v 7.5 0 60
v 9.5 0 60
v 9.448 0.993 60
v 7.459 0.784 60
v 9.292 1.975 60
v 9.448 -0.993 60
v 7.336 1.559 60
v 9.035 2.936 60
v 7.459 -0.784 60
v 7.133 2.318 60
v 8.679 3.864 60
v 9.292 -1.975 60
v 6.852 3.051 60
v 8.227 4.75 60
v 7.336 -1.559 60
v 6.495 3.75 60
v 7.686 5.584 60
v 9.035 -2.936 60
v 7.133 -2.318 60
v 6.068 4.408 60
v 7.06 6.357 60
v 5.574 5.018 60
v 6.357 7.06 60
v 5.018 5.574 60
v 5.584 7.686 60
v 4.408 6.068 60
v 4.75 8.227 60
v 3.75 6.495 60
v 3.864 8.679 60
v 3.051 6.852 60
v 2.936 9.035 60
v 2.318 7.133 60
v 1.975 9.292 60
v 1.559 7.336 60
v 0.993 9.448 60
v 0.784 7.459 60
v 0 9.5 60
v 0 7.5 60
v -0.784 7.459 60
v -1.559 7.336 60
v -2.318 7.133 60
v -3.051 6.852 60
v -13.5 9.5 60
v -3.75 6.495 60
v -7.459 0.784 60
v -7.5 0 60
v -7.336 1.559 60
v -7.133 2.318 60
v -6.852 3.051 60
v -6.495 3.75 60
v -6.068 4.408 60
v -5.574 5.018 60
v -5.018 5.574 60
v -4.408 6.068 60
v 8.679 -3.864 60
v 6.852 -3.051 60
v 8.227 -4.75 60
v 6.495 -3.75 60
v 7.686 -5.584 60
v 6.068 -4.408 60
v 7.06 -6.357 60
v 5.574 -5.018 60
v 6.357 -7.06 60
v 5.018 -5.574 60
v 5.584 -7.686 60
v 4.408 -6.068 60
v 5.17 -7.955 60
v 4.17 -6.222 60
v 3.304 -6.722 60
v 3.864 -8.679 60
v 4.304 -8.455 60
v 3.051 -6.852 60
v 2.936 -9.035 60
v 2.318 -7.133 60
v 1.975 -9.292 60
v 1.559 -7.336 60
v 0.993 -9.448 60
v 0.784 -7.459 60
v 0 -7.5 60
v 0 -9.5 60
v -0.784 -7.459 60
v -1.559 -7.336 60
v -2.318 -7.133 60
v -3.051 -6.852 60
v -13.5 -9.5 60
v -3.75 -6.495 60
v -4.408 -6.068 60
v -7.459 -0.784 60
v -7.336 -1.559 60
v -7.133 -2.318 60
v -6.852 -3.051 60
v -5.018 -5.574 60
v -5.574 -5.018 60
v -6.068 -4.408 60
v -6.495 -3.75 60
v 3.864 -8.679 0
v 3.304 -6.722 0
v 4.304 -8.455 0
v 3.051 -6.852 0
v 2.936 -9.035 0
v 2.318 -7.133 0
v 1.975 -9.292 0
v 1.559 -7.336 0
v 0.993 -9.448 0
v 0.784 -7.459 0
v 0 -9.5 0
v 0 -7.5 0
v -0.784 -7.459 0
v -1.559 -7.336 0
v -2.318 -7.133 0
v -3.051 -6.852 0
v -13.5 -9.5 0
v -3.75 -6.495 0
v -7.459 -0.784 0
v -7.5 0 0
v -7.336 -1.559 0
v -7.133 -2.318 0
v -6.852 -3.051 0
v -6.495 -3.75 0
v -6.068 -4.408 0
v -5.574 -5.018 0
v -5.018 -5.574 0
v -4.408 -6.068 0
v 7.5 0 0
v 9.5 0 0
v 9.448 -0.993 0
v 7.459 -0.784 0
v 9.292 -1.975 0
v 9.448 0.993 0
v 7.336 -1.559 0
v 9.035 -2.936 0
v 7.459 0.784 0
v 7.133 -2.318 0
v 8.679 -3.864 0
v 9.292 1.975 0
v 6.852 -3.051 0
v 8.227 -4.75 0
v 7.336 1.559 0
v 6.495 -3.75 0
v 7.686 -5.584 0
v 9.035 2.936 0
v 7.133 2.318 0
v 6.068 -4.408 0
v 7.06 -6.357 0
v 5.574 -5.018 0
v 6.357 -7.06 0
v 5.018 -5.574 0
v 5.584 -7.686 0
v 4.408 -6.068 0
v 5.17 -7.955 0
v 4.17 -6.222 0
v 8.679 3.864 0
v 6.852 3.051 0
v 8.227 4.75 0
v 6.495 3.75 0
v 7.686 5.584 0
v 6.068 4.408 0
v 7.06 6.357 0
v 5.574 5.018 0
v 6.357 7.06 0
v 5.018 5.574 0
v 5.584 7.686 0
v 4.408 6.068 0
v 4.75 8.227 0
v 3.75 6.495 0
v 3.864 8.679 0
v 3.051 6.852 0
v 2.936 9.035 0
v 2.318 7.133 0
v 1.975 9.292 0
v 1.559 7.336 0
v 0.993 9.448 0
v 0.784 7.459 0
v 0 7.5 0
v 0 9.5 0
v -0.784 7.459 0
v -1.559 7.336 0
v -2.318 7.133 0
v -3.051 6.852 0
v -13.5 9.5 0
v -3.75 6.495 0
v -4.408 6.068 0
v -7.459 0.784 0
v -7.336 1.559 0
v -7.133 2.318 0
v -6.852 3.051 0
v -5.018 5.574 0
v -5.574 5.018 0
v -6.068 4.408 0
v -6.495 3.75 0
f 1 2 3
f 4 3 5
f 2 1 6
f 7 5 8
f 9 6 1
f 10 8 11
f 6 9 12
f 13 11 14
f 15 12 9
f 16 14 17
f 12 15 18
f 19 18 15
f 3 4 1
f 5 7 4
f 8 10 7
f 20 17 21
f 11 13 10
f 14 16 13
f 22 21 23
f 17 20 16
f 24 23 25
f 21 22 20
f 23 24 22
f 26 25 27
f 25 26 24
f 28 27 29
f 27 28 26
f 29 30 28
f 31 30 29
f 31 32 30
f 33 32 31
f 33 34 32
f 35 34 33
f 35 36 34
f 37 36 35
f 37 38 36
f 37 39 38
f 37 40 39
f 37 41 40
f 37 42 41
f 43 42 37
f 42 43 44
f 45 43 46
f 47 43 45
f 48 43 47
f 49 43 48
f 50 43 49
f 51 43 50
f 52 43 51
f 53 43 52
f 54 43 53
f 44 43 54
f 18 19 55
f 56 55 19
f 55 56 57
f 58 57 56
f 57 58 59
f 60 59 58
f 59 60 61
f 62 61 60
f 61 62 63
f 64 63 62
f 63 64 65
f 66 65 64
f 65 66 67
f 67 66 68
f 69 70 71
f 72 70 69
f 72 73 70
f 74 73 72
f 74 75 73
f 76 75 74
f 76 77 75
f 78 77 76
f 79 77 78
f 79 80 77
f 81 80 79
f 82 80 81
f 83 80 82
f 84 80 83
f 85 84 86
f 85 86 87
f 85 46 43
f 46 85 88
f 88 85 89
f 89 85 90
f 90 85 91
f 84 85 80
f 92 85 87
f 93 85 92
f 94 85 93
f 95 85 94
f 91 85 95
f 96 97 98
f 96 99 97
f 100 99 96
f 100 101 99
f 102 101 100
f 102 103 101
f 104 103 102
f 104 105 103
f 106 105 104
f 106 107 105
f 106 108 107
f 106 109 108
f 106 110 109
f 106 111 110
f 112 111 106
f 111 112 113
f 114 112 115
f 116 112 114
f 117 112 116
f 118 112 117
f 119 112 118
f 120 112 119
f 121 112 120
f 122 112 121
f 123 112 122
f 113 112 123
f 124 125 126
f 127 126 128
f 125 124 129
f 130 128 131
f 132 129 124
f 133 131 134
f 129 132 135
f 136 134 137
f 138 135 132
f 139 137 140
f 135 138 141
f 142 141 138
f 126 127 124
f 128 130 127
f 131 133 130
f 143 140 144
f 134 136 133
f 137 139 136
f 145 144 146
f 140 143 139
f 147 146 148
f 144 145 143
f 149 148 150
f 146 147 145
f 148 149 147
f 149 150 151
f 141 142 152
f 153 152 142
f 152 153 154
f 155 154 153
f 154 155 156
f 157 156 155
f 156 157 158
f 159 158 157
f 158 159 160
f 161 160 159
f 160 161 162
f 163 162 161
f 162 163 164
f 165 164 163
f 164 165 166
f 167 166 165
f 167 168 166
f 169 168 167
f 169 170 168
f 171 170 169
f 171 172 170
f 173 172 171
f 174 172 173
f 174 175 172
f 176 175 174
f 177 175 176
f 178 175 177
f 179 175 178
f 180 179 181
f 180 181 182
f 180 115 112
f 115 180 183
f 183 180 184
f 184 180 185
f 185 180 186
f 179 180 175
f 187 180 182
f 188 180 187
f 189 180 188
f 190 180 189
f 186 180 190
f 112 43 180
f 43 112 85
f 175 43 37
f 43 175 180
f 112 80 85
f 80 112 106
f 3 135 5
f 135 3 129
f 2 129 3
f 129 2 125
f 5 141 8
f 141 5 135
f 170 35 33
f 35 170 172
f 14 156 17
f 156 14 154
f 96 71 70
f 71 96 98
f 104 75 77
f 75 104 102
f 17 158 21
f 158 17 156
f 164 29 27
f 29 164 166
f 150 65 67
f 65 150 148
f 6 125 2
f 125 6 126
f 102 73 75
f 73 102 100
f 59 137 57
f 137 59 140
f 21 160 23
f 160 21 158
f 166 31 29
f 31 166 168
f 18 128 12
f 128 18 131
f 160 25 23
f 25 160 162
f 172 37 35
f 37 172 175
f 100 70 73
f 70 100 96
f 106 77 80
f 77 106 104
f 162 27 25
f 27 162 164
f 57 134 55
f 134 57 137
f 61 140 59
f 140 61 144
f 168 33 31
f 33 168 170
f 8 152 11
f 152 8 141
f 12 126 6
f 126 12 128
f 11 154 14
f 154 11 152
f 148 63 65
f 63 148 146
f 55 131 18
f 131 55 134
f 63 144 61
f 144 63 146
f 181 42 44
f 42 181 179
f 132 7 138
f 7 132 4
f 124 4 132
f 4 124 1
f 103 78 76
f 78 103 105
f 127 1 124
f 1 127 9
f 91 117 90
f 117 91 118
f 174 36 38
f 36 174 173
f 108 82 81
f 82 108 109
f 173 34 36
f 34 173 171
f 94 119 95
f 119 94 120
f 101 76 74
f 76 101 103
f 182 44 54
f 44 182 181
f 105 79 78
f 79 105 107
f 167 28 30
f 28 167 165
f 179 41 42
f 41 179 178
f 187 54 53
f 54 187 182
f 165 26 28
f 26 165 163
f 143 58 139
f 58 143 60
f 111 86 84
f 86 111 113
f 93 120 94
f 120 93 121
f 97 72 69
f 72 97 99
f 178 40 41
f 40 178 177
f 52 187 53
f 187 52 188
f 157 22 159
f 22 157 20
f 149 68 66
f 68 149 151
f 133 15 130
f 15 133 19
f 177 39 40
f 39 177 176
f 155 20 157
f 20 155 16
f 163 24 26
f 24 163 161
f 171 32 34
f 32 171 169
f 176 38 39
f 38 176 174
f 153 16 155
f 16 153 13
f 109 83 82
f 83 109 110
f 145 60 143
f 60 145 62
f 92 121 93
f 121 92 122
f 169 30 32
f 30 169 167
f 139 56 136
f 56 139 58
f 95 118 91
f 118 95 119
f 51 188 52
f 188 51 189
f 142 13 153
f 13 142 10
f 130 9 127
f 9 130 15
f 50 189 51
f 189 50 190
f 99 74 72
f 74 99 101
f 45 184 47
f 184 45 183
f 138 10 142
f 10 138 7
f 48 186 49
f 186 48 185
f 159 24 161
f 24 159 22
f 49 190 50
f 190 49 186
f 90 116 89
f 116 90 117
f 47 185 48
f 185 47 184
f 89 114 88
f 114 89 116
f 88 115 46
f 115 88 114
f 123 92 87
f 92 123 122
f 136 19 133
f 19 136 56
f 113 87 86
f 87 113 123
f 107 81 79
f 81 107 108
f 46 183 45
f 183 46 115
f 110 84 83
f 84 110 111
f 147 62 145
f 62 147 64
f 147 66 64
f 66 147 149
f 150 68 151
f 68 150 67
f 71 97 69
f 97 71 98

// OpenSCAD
// PRUSA iteration3
// Bearing holders
// GNU GPL v3
// Josef Průša <iam@josefprusa.cz> and contributors
// http://www.reprap.org/wiki/Prusa_Mendel
// http://prusamendel.org

bearing_diameter = 15;

module horizontal_bearing_base(bearings=1){
 translate(v=[0,0,6]) cube(size = [24,8+bearings*25,12], center = true);	
}
module horizontal_bearing_holes(bearings=1){
 cutter_lenght = 10+bearings*25;
 one_holder_lenght = 8+25;
 holder_lenght = 8+bearings*25;
 
 // Main bearing cut
 difference(){
  translate(v=[0,0,12]) rotate(a=[90,0,0]) translate(v=[0,0,-cutter_lenght/2]) cylinder(h = cutter_lenght, r=bearing_diameter/2, $fn=50);
  // Bearing retainers
  translate(v=[0,1-holder_lenght/2,3]) cube(size = [24,6,8], center = true);
  translate(v=[0,-1+holder_lenght/2,3]) cube(size = [24,6,8], center = true);
 }
 
 // Ziptie cutouts
 ziptie_cut_ofset = 0;
 for ( i = [0 : bearings-1] ){
  // For easier positioning I move them by half of one 
  // bearing holder then add each bearign lenght and then center again
  translate(v=[0,-holder_lenght/2,0]) translate(v=[0,one_holder_lenght/2+i*25,0]) difference(){
   union(){
    translate(v=[0,2-6,12]) rotate(a=[90,0,0]) translate(v=[0,0,0]) cylinder(h = 4, r=12.5, $fn=50);
    translate(v=[0,2+6,12]) rotate(a=[90,0,0]) translate(v=[0,0,0]) cylinder(h = 4, r=12.5, $fn=50);
   }
   translate(v=[0,10,12]) rotate(a=[90,0,0]) translate(v=[0,0,0]) cylinder(h = 24, r=10, $fn=50);
  }
 }
 
}

module horizontal_bearing_test(){
 difference(){
  horizontal_bearing_base(1);
  horizontal_bearing_holes(1);
 }
 translate(v=[30,0,0]) difference(){
  horizontal_bearing_base(2);
  horizontal_bearing_holes(2);
 }
 translate(v=[60,0,0]) difference(){
  horizontal_bearing_base(3);
  horizontal_bearing_holes(3);
 }
}



thinwall = 2;
bearing_size = bearing_diameter + 2 * thinwall;

module vertical_bearing_base(){
 translate(v=[-2-bearing_size/4,0,30]) cube(size = [4+bearing_size/2,bearing_size,60], center = true);
 cylinder(h = 60, r=bearing_size/2, $fn = 60);
}

module vertical_bearing_holes(){
  translate(v=[0,0,-1]) cylinder(h = 62, r=bearing_diameter/2, $fn = 60);
  rotate(a=[0,0,-60]) translate(v=[10,0,31]) cube(size = [10,1,62], center = true);
}

difference(){
vertical_bearing_base();
vertical_bearing_holes();
}
